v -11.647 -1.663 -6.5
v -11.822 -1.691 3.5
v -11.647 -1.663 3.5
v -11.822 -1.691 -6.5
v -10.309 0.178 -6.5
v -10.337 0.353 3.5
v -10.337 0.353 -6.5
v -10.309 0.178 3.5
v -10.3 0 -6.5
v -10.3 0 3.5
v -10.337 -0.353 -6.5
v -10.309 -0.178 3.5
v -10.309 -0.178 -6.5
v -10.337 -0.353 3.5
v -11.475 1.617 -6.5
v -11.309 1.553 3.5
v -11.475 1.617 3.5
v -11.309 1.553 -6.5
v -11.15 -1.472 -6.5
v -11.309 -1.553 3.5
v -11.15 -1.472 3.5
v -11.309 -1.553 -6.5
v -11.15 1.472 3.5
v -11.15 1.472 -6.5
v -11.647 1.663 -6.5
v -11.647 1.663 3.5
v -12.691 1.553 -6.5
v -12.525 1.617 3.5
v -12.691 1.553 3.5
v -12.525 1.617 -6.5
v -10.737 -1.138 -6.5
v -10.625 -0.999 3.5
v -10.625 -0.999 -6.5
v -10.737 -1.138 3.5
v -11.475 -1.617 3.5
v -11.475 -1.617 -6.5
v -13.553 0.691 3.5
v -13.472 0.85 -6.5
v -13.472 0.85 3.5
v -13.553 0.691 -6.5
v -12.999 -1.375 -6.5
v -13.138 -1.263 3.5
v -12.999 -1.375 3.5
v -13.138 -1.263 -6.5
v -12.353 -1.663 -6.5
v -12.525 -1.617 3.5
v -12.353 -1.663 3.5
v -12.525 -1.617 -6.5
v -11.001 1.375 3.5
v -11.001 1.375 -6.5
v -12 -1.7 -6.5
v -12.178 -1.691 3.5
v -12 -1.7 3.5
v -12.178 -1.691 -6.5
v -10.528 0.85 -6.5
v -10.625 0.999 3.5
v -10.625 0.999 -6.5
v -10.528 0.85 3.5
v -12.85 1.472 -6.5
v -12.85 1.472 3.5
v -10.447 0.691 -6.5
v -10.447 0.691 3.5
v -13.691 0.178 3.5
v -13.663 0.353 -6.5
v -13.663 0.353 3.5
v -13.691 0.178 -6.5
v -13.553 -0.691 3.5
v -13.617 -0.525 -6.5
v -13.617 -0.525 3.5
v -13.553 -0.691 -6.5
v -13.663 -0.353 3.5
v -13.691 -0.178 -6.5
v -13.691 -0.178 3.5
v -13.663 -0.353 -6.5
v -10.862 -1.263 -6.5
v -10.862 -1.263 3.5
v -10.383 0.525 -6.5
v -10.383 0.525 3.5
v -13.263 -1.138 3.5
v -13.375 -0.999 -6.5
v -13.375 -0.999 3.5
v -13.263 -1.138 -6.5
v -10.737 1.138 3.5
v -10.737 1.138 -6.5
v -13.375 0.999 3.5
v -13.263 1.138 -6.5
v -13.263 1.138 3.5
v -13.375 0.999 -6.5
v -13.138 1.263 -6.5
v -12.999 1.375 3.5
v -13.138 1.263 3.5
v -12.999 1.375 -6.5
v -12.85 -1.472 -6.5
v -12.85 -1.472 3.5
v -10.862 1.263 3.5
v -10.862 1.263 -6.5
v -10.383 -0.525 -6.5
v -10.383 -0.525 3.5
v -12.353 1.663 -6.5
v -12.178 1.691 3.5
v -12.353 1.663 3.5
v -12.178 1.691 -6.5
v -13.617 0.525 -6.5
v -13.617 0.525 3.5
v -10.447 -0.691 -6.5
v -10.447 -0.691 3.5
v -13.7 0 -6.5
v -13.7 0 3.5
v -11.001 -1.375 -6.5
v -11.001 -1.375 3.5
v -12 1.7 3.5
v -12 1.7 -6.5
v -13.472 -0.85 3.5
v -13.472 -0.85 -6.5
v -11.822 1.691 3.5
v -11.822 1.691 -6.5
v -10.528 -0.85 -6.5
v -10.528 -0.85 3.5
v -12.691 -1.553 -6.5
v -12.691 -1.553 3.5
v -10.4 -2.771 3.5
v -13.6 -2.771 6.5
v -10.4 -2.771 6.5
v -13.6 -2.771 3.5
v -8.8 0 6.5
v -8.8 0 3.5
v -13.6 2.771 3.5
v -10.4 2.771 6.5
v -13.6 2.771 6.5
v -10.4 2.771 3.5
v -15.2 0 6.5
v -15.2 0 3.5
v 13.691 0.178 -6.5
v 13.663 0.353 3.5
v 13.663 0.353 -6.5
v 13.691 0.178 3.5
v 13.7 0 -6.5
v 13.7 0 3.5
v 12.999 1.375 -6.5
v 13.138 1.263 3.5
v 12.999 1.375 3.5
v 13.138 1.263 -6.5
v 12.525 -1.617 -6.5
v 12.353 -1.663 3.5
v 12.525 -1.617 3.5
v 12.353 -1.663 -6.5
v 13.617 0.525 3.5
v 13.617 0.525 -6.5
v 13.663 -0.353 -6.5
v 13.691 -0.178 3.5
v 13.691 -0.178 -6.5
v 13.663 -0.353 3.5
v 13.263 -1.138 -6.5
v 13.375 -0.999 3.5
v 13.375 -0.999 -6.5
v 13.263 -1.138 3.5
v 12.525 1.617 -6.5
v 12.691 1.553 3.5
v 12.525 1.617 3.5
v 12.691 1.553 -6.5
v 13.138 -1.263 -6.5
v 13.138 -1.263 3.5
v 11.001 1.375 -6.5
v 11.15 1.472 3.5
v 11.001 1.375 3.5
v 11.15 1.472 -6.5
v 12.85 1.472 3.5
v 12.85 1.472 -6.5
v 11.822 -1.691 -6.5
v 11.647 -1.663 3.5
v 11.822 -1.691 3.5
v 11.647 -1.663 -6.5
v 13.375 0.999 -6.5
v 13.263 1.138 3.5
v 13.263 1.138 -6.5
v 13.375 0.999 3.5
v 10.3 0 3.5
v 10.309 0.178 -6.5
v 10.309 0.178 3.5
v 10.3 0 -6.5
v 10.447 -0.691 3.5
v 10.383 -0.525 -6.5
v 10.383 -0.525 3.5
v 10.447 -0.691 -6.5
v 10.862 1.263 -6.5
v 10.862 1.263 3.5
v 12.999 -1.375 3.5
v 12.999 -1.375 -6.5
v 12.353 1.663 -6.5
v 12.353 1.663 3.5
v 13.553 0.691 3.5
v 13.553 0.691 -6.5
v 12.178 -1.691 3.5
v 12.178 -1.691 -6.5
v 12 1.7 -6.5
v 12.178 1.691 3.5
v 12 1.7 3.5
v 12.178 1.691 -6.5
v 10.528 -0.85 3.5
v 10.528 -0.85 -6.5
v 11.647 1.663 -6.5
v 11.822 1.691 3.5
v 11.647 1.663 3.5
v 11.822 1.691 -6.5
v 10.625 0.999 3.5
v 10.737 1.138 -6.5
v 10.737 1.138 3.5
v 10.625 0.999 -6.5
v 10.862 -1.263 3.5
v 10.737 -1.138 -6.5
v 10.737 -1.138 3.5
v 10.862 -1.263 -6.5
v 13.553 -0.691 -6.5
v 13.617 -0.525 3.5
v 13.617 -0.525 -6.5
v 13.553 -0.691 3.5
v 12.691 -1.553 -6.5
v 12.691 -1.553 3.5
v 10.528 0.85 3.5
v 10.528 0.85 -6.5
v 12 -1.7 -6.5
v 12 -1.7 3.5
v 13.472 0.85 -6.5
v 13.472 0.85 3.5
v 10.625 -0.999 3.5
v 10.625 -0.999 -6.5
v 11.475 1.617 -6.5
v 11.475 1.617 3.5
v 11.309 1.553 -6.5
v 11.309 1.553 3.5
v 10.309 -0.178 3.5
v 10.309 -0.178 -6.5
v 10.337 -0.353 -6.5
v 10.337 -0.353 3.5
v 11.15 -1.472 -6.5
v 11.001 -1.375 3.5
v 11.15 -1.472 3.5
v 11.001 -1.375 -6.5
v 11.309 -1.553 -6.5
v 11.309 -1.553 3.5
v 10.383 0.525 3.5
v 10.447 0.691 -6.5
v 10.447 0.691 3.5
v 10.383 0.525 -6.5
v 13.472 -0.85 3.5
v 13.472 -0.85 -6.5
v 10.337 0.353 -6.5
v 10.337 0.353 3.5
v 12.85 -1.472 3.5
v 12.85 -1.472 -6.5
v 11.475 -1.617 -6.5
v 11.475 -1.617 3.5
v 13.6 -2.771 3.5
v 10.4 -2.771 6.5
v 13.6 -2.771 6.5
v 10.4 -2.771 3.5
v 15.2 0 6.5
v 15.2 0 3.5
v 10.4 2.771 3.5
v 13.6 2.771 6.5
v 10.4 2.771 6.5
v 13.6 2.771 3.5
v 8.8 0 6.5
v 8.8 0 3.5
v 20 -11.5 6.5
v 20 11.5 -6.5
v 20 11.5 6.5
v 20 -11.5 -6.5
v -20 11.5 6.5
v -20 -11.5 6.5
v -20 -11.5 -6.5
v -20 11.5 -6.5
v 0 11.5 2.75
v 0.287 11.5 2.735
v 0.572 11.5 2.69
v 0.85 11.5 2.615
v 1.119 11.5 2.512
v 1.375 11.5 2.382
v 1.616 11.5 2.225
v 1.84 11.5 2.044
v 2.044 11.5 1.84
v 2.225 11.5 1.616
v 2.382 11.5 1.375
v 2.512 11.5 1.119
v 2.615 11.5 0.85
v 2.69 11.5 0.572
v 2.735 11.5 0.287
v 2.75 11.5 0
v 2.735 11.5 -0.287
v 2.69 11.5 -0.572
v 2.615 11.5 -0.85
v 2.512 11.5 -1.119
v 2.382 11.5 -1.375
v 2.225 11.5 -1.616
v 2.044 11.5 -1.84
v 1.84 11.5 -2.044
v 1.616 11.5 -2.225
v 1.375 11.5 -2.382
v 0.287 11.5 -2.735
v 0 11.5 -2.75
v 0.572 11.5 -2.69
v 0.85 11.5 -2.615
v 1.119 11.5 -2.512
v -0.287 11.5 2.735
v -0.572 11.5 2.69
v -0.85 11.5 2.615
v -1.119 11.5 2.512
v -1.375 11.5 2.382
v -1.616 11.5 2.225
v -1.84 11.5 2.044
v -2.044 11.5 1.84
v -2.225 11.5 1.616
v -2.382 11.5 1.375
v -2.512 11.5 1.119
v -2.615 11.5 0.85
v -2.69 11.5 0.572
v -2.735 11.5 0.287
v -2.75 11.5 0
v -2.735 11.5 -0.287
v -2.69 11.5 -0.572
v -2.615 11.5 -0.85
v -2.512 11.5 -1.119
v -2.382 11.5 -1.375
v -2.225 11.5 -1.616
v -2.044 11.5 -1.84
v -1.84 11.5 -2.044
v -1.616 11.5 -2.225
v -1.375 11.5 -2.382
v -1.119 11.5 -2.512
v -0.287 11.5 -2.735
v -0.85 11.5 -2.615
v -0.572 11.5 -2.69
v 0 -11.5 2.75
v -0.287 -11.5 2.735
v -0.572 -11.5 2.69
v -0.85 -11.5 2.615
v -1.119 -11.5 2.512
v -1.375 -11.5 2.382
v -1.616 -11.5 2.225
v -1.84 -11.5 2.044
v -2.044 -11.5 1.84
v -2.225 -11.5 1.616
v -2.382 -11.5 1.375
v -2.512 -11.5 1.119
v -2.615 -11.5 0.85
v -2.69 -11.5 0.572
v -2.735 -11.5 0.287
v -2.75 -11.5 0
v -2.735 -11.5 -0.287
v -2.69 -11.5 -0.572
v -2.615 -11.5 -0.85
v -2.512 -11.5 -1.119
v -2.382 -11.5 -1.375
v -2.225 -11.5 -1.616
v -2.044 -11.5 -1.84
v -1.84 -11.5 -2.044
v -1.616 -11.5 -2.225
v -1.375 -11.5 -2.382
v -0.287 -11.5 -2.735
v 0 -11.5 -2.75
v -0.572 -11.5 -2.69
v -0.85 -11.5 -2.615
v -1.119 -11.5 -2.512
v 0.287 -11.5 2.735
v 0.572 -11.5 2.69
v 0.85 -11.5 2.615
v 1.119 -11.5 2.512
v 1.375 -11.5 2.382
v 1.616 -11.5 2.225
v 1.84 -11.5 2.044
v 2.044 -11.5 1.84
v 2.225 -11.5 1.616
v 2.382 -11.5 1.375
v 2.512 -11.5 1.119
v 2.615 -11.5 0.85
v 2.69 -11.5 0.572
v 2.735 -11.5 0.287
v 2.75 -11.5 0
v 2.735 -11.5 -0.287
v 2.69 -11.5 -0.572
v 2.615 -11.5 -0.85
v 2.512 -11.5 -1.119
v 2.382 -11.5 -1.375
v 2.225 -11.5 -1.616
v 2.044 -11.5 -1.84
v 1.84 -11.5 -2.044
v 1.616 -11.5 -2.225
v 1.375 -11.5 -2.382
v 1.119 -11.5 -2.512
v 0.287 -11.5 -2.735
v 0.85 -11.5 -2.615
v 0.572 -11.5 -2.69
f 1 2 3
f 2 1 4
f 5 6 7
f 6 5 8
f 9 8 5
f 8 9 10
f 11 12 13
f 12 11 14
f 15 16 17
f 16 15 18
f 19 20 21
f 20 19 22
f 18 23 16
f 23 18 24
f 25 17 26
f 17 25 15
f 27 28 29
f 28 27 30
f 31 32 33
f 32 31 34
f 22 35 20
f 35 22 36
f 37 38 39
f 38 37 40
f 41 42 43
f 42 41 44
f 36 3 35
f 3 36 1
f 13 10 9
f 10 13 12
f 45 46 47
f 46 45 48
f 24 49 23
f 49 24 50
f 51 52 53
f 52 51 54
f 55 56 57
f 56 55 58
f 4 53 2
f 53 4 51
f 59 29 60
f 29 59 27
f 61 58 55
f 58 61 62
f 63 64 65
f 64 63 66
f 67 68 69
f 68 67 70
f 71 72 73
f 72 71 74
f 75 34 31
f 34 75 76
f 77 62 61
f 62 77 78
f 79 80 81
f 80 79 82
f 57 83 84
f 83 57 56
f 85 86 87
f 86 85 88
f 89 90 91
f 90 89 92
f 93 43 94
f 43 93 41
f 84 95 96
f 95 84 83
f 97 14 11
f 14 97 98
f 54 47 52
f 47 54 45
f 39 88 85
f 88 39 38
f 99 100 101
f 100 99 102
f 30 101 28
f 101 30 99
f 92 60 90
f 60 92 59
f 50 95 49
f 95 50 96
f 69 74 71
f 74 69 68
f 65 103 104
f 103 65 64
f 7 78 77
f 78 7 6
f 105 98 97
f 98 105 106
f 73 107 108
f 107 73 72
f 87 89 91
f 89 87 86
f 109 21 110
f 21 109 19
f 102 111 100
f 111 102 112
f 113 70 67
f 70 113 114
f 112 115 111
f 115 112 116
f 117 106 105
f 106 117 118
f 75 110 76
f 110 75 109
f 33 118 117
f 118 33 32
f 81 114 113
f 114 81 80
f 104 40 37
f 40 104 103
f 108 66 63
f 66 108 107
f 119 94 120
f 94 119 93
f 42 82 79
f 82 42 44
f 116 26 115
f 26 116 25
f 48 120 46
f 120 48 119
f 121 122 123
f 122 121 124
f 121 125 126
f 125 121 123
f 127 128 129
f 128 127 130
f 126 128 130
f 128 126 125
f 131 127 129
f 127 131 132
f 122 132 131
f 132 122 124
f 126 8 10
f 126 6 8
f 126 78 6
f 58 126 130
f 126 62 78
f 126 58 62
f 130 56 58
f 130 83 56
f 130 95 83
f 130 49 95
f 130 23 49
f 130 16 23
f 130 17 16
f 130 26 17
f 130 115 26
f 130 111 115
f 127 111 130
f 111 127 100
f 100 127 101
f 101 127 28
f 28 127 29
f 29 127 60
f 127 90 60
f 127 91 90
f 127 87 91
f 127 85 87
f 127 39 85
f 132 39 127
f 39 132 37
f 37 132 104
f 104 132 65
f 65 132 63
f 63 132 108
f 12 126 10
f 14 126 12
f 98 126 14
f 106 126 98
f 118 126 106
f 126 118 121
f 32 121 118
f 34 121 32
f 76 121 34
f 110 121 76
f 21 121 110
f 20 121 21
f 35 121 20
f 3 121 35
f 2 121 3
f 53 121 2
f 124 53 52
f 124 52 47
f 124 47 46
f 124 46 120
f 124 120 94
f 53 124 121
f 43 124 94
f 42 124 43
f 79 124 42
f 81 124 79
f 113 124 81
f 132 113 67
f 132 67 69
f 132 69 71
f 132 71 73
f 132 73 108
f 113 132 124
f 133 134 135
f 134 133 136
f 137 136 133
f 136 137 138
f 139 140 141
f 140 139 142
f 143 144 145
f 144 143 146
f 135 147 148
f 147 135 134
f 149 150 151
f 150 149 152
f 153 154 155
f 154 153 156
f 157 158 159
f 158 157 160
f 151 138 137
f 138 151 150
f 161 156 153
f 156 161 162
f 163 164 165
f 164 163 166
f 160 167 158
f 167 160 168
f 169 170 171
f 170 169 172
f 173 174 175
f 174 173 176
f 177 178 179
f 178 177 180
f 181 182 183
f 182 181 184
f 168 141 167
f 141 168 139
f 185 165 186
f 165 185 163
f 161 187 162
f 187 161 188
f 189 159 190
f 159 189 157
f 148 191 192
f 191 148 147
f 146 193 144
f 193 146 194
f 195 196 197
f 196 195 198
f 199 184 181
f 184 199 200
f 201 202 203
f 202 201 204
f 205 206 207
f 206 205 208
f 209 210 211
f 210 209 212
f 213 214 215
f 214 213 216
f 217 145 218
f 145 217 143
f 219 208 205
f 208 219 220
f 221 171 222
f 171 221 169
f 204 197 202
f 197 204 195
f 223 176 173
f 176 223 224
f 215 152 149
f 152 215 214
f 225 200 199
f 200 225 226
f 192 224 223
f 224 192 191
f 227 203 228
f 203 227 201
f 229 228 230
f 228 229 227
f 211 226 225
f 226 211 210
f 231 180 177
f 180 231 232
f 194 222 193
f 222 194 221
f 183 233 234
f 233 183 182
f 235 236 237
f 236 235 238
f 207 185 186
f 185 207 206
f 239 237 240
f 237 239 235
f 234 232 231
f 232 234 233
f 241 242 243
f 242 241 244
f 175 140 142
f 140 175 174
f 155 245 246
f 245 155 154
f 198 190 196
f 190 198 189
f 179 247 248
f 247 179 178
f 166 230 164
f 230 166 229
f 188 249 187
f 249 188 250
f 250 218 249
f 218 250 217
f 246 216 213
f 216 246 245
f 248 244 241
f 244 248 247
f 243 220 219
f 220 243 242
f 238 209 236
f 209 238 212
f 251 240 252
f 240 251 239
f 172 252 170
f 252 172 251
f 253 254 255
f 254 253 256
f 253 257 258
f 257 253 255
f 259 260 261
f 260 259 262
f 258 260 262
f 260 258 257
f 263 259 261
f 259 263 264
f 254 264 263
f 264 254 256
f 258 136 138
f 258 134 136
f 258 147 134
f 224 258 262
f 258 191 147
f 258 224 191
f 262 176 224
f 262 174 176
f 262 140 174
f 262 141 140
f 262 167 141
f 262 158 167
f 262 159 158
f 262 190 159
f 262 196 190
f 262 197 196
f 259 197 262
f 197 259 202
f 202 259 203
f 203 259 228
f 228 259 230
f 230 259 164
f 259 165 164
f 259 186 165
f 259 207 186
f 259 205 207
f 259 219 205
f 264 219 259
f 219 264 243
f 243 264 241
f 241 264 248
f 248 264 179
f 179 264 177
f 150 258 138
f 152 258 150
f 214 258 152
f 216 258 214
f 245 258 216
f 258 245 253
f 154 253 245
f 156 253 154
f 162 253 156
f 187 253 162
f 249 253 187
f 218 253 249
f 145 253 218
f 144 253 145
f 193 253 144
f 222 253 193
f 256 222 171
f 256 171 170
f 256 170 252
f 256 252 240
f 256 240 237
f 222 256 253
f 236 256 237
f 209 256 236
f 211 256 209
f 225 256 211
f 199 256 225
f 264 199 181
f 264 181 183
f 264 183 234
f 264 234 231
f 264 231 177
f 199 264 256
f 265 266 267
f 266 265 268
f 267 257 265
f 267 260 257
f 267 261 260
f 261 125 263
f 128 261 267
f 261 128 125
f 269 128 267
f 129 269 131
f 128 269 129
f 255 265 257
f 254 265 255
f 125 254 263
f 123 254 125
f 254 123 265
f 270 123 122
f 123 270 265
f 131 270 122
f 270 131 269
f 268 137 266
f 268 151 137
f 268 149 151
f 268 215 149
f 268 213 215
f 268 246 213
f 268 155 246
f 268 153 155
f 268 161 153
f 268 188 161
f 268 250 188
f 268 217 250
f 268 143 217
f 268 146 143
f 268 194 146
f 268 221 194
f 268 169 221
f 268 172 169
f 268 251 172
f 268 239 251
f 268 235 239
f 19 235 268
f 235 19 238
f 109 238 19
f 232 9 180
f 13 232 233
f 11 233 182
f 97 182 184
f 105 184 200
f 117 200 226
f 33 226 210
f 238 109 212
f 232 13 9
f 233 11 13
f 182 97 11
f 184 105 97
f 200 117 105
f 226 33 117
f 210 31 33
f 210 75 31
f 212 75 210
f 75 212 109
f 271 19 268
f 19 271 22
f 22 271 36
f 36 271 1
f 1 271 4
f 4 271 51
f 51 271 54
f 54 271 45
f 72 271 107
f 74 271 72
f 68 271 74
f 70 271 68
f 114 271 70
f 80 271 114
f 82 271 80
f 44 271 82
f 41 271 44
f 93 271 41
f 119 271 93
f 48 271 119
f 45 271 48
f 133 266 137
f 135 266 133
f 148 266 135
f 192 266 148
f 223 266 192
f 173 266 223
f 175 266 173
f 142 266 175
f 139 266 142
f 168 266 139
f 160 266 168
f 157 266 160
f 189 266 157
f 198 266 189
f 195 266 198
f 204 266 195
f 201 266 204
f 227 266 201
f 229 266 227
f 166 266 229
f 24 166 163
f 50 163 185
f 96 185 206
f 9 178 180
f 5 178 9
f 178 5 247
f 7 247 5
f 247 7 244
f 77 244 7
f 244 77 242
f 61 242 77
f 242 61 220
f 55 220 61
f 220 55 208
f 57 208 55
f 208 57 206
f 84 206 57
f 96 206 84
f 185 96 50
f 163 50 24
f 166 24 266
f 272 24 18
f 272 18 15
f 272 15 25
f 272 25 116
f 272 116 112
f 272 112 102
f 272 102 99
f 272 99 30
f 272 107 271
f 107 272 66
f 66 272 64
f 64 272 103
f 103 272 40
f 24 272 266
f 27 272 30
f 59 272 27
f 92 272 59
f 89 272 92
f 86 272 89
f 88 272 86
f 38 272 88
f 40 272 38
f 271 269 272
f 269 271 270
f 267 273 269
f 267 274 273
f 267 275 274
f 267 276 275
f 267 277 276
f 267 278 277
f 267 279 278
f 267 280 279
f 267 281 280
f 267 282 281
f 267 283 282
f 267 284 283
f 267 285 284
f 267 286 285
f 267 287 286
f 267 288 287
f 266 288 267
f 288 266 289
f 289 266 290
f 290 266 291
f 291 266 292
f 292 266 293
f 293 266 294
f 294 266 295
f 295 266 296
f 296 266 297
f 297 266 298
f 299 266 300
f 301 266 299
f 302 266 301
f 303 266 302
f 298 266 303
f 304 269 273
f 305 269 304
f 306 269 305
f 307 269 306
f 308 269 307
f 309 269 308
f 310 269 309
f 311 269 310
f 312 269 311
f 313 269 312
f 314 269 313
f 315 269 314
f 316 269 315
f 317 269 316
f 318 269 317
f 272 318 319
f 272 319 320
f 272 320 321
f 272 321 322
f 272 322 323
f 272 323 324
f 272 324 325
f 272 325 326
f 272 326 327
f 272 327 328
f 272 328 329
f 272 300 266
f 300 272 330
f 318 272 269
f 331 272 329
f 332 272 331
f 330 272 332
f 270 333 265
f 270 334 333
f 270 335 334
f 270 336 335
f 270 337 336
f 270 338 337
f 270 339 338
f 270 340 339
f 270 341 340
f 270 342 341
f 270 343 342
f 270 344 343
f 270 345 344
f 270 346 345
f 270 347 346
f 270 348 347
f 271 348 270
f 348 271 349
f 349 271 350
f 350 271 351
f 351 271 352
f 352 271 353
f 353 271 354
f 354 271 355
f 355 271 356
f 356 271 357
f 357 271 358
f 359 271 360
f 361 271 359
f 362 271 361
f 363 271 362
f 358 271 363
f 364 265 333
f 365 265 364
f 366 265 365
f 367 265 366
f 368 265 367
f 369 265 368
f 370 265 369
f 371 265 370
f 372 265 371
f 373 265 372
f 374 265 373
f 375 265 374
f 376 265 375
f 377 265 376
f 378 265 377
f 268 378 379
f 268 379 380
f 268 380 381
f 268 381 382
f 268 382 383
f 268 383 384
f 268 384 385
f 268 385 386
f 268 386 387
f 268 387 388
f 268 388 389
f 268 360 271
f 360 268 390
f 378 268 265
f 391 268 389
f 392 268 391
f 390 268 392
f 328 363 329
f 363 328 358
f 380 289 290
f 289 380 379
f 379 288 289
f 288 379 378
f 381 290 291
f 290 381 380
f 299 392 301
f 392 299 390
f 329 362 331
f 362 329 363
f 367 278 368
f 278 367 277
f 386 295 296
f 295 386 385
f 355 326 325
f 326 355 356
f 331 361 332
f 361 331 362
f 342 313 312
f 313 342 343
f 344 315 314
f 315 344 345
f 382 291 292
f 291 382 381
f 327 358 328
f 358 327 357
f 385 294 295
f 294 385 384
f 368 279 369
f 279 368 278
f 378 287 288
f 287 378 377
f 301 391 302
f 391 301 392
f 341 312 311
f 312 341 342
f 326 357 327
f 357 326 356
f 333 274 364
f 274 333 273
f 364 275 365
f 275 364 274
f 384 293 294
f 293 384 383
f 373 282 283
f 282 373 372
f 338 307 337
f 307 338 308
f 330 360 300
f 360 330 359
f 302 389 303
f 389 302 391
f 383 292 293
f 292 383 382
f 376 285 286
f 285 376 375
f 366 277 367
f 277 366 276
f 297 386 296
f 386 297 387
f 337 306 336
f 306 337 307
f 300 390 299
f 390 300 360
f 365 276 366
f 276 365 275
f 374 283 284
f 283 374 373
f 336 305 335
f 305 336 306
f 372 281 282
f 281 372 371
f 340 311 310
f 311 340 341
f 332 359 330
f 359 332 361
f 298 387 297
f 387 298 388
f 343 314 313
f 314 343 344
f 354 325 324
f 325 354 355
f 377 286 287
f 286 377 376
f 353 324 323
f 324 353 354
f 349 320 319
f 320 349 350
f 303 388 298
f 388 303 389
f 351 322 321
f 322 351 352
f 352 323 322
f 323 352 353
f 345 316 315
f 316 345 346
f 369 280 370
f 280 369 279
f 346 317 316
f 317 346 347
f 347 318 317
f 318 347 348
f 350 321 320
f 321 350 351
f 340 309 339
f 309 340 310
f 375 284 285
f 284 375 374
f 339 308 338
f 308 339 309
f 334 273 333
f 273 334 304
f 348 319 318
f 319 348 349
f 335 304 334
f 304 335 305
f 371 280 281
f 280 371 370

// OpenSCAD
// Cable strain-relief clamp for 5 mm bundle.
$fn = 60;
eps = 0.02;
body_l = 40;
body_w = 23;
body_h = 13;
cable_d = 5.5;
bolt_pitch = 24;
difference() {
    cube([body_l, body_w, body_h], center = true);
    translate([0, -body_w / 2 - eps, 0]) rotate([-90, 0, 0]) cylinder(d = cable_d, h = body_w + 2 * eps);
    for (x = [-bolt_pitch / 2, bolt_pitch / 2]) {
        translate([x, 0, -body_h / 2 - eps]) cylinder(d = 3.4, h = body_h + 2 * eps);
        translate([x, 0, body_h / 2 - 3]) cylinder(d = 6.4, h = 3 + eps, $fn = 6);
    }
}
